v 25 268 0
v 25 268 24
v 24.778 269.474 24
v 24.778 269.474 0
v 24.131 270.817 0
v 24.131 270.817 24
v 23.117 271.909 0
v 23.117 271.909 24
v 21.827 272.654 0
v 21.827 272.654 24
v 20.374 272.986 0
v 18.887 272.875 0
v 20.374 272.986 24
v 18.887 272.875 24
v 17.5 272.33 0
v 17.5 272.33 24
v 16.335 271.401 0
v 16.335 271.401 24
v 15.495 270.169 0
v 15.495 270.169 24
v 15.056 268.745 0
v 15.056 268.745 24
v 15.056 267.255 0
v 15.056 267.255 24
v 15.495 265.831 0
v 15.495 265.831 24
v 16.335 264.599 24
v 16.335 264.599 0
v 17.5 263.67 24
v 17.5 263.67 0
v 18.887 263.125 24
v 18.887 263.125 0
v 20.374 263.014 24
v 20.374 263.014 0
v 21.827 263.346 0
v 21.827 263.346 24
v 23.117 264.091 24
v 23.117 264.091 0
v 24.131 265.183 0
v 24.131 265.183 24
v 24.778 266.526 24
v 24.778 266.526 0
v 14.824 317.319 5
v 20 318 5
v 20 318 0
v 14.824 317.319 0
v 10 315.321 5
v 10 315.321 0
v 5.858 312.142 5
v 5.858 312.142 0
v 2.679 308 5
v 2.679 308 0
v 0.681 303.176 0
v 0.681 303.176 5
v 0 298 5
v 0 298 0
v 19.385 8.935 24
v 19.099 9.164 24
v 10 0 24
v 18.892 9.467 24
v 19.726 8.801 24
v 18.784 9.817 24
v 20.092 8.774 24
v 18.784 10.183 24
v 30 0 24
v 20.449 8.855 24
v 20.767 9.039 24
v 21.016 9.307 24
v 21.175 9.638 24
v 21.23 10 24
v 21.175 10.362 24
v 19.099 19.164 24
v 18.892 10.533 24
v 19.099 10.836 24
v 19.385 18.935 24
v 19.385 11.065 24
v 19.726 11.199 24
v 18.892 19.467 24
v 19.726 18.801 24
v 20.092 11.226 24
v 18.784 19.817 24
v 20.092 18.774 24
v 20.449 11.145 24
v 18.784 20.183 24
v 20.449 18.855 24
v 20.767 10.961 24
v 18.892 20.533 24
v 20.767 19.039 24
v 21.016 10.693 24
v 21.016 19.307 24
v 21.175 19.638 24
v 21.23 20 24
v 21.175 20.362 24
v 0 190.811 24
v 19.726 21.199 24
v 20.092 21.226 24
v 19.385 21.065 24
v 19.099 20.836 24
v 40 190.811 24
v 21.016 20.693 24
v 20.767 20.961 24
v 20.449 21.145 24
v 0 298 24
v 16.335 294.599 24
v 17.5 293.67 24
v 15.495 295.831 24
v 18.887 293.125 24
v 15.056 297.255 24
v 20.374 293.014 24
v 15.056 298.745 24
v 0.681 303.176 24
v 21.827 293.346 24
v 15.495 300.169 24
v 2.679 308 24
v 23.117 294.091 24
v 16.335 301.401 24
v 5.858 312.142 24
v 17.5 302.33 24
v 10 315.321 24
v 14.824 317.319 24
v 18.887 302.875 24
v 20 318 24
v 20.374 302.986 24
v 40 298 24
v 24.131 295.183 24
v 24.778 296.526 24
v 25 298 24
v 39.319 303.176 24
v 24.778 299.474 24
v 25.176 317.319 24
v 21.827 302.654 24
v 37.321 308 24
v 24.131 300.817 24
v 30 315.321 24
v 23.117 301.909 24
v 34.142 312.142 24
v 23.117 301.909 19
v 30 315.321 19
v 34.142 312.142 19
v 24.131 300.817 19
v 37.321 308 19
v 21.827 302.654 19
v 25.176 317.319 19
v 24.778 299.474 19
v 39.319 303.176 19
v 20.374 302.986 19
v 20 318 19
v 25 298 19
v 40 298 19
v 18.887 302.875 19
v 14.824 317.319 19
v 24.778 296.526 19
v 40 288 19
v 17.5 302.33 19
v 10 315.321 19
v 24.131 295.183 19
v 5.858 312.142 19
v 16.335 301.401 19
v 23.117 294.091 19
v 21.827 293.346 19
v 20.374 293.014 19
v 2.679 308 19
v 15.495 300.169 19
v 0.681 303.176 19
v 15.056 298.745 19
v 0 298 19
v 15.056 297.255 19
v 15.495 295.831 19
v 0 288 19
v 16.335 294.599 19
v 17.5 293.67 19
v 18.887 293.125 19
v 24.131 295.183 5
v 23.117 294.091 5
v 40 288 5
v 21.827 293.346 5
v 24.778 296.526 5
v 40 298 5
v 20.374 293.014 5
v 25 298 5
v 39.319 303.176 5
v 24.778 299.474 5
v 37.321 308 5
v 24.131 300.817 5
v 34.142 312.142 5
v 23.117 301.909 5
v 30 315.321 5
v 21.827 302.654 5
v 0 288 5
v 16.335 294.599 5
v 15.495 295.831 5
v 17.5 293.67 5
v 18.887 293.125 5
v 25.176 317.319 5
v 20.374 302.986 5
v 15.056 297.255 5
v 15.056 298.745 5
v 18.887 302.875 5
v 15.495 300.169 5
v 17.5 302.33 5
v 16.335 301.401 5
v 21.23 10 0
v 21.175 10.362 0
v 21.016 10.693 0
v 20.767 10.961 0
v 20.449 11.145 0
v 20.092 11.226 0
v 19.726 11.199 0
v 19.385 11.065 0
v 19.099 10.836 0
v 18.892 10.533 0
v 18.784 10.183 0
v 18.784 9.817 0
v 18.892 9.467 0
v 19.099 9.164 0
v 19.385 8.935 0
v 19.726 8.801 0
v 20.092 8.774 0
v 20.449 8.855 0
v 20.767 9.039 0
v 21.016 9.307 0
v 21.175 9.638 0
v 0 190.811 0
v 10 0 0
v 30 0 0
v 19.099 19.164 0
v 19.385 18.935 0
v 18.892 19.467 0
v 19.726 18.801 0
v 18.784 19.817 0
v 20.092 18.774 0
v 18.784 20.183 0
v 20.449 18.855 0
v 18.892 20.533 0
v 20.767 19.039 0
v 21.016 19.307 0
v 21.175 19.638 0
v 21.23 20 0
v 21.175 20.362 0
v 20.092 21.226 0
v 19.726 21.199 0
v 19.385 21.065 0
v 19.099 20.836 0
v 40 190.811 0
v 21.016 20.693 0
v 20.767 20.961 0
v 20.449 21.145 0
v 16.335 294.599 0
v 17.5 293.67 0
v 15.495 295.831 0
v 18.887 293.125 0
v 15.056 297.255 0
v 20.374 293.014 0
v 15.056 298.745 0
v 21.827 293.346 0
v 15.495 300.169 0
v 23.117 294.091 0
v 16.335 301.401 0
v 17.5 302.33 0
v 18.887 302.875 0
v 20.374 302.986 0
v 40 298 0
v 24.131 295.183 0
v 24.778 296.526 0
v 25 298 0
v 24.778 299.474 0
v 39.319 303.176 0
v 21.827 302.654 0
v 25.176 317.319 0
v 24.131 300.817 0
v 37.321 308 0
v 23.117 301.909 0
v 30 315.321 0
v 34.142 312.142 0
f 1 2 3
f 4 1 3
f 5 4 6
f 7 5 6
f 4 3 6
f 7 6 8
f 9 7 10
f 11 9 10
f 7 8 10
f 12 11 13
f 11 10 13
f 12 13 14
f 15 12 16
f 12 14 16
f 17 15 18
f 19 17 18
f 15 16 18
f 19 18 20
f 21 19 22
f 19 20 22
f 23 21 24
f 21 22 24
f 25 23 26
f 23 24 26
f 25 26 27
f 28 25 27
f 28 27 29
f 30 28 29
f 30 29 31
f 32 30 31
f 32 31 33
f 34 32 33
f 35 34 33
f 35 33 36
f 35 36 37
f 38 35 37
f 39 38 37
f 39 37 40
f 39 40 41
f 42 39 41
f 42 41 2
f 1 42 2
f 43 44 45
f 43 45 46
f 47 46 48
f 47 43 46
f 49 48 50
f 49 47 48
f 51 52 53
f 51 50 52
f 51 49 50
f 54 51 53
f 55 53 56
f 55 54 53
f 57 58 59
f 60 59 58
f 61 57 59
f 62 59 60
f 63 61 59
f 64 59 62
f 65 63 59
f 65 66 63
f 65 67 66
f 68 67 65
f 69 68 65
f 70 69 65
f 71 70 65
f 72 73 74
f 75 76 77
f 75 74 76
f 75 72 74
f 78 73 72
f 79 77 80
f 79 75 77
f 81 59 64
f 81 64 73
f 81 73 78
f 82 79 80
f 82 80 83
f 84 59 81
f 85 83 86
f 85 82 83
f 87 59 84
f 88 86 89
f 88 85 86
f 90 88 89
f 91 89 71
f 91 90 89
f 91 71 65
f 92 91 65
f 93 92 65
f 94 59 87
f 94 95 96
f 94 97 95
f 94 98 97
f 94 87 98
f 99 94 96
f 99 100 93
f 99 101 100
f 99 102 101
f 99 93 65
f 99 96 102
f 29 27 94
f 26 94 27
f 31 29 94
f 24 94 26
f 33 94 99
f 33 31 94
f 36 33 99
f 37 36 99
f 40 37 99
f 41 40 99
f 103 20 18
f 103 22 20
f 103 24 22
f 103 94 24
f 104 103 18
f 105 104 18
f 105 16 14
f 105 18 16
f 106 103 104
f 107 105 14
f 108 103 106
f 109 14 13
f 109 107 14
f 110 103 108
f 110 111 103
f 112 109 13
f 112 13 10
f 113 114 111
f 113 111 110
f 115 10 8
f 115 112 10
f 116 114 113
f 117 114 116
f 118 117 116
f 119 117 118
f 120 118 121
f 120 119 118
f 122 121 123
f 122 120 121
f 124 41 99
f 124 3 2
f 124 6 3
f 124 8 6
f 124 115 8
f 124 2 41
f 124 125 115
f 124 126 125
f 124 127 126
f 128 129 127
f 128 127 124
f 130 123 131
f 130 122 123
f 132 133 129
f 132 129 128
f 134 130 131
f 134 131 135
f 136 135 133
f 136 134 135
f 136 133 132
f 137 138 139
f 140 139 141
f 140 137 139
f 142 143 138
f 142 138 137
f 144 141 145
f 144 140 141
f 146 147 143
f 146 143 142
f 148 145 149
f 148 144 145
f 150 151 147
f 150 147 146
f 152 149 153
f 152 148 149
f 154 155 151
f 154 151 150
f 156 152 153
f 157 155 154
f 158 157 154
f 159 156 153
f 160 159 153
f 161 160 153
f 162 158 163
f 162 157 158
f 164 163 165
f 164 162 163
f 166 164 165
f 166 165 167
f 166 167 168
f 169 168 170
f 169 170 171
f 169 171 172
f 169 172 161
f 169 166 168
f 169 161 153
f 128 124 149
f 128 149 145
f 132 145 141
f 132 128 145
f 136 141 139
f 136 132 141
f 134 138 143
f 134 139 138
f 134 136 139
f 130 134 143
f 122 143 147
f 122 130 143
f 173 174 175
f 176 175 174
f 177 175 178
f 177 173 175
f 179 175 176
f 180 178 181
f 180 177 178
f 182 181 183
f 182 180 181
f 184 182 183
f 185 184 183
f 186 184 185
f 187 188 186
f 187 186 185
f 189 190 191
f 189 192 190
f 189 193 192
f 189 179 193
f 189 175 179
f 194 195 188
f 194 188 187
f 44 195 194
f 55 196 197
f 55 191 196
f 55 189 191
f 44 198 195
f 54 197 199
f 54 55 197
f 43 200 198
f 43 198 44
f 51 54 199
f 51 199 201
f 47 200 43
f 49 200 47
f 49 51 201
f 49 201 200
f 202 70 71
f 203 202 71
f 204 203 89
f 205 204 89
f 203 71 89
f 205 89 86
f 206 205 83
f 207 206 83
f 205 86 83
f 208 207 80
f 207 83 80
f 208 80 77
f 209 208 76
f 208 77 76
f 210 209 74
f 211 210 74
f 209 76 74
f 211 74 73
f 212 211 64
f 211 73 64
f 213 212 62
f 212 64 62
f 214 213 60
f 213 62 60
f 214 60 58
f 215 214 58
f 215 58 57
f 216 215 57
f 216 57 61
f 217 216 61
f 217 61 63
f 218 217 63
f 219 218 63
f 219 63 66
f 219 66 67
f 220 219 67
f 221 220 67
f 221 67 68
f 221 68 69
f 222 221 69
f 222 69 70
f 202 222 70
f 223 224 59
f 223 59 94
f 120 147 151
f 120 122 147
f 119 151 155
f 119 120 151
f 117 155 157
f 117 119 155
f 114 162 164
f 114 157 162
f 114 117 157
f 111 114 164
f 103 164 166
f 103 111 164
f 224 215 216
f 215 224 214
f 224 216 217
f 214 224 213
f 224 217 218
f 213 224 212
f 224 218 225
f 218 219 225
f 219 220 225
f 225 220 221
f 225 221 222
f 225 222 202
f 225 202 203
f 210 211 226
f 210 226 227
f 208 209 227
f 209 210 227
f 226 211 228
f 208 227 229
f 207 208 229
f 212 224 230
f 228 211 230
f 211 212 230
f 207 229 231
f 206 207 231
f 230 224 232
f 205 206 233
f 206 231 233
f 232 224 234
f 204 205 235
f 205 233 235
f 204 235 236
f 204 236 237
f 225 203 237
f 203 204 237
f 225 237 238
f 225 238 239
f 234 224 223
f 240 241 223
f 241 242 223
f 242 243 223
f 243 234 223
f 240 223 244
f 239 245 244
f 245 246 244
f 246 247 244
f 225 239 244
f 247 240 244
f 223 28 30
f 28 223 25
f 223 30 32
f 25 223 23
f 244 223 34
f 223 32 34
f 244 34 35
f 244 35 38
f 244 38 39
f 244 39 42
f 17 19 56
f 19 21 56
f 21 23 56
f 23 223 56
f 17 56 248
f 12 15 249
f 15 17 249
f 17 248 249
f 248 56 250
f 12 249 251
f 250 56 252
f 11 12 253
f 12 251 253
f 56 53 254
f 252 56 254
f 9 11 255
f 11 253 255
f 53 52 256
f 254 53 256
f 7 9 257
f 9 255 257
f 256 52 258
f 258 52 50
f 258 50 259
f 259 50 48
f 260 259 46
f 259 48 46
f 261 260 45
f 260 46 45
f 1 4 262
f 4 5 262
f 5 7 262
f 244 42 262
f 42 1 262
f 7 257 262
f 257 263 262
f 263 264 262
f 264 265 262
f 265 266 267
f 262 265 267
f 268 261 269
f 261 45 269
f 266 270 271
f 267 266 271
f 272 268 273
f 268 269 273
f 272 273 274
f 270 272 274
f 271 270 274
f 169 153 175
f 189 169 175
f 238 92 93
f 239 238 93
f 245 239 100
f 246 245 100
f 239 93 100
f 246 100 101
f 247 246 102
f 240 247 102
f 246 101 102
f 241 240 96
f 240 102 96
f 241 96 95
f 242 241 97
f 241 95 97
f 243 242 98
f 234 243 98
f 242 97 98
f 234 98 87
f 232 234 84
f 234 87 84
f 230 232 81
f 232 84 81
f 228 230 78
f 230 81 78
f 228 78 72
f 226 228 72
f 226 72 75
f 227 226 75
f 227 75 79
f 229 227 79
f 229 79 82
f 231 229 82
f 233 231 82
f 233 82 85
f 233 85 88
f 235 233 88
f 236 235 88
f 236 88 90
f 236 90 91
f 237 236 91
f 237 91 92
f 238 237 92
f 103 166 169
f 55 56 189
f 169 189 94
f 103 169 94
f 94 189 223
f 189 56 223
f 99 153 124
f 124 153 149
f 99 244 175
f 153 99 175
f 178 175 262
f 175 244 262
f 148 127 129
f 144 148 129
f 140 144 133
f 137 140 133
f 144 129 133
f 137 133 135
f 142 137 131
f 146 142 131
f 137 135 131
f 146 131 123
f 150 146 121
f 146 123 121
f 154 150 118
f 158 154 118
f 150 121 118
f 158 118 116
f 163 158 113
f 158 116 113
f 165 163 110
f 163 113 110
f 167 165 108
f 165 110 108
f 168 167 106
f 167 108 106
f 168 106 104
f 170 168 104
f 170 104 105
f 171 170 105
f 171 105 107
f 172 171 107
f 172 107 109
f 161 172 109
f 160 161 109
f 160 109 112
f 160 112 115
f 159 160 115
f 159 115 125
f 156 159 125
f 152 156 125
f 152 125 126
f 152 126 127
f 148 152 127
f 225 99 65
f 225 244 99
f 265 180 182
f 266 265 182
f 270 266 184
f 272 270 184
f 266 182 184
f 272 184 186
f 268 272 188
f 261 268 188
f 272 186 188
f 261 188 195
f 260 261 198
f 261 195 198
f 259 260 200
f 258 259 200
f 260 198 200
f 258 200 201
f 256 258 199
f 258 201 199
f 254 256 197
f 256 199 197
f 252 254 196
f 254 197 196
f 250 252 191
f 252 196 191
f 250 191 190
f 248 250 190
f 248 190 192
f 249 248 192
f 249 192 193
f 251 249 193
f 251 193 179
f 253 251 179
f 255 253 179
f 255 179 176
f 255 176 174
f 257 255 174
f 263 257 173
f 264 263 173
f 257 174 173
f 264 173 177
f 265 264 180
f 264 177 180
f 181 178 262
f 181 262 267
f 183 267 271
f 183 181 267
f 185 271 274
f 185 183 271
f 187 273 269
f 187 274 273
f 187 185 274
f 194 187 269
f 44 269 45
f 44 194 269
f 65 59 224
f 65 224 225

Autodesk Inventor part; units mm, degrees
ref_plane "YZ Plane" through (0, 0, 0) normal (1, 0, 0) x (0, 1, 0)
ref_plane "XZ Plane" through (0, 0, 0) normal (0, 1, 0) x (-1, 0, 0)
ref_plane "XY Plane" through (0, 0, 0) normal (0, 0, 1) x (1, 0, 0)
sketch "スケッチ1" plane through (0, 0, 0) normal (0, 0, 1) x (1, 0, 0)
  line L0 (0, 0) -> (40, 0)
  line L1 (40, 0) -> (40, 318)
  line L2 (40, 318) -> (0, 318)
  line L3 (0, 318) -> (0, 0)
  line L4 (10, 0) -> (0, 190.8114)
  line L5 (40, 190.8114) -> (30, 0)
  dimension "d0" = 40
  dimension "d1" = 318
  dimension "d64" = 20
  dimension "d65" = 10
  dimension "d66" = 87
  dimension "d67" = 87
extrude "押し出し1" add sketch "スケッチ1" along normal blind 24 contours L4 L3 L2 L1 L5 L0
sketch "スケッチ6" plane through (0, 0, 24) normal (0, 0, 1) x (1, 0, 0)
  circle A0 centre (20, 268) radius 5
  line L0 (40, 318) -> (0, 318) projected
  line L1 (40, 190.8114) -> (40, 318) projected
  circle A1 centre (20, 20) radius 1.2295
  circle A2 centre (20, 10) radius 1.2295
  line L2 (0, 0) -> (30, 0) projected
  circle A3 centre (20, 298) radius 5
  point P0 (20, 318)
  point P1 (40, 0)
  dimension "d42" = 10
  dimension "d44" = 20
  dimension "d45" = 2.459
  dimension "d46" = 2.459
  dimension "d47" = 10
  dimension "d48" = 10
  dimension "d49" = 20
  dimension "d50" = 20
  dimension "d53" = 10
  dimension "d54" = 20
  dimension "d55" = 30
  dimension "d56" = 20
extrude "押し出し4" cut sketch "スケッチ6" against normal through all
sketch "スケッチ8" plane through (0, 0, 0) normal (-1, 0, 0) x (0, 0, 1)
  line L0 (0, 318) -> (24, 318) projected
  line L1 (5, 318) -> (19, 318)
  line L2 (19, 318) -> (19, 288)
  line L3 (19, 288) -> (5, 288)
  line L4 (5, 288) -> (5, 318)
  line L5 (0, 318) -> (0, 0) projected
  dimension "d57" = 5
  dimension "d58" = 14
  dimension "d59" = 30
extrude "押し出し5" cut sketch "スケッチ8" against normal through all
fillet "フィレット1" radius 20 4 edges at (40, 318, 21.5) (40, 318, 2.5) (0, 318, 2.5) (0, 318, 21.5)
equation "\"d67\" = d66"
equation "\"d45\" = d46"
equation "\"d48\" = d47"
equation "\"d50\" = d49"
properties part number "legparts_06(three)"
